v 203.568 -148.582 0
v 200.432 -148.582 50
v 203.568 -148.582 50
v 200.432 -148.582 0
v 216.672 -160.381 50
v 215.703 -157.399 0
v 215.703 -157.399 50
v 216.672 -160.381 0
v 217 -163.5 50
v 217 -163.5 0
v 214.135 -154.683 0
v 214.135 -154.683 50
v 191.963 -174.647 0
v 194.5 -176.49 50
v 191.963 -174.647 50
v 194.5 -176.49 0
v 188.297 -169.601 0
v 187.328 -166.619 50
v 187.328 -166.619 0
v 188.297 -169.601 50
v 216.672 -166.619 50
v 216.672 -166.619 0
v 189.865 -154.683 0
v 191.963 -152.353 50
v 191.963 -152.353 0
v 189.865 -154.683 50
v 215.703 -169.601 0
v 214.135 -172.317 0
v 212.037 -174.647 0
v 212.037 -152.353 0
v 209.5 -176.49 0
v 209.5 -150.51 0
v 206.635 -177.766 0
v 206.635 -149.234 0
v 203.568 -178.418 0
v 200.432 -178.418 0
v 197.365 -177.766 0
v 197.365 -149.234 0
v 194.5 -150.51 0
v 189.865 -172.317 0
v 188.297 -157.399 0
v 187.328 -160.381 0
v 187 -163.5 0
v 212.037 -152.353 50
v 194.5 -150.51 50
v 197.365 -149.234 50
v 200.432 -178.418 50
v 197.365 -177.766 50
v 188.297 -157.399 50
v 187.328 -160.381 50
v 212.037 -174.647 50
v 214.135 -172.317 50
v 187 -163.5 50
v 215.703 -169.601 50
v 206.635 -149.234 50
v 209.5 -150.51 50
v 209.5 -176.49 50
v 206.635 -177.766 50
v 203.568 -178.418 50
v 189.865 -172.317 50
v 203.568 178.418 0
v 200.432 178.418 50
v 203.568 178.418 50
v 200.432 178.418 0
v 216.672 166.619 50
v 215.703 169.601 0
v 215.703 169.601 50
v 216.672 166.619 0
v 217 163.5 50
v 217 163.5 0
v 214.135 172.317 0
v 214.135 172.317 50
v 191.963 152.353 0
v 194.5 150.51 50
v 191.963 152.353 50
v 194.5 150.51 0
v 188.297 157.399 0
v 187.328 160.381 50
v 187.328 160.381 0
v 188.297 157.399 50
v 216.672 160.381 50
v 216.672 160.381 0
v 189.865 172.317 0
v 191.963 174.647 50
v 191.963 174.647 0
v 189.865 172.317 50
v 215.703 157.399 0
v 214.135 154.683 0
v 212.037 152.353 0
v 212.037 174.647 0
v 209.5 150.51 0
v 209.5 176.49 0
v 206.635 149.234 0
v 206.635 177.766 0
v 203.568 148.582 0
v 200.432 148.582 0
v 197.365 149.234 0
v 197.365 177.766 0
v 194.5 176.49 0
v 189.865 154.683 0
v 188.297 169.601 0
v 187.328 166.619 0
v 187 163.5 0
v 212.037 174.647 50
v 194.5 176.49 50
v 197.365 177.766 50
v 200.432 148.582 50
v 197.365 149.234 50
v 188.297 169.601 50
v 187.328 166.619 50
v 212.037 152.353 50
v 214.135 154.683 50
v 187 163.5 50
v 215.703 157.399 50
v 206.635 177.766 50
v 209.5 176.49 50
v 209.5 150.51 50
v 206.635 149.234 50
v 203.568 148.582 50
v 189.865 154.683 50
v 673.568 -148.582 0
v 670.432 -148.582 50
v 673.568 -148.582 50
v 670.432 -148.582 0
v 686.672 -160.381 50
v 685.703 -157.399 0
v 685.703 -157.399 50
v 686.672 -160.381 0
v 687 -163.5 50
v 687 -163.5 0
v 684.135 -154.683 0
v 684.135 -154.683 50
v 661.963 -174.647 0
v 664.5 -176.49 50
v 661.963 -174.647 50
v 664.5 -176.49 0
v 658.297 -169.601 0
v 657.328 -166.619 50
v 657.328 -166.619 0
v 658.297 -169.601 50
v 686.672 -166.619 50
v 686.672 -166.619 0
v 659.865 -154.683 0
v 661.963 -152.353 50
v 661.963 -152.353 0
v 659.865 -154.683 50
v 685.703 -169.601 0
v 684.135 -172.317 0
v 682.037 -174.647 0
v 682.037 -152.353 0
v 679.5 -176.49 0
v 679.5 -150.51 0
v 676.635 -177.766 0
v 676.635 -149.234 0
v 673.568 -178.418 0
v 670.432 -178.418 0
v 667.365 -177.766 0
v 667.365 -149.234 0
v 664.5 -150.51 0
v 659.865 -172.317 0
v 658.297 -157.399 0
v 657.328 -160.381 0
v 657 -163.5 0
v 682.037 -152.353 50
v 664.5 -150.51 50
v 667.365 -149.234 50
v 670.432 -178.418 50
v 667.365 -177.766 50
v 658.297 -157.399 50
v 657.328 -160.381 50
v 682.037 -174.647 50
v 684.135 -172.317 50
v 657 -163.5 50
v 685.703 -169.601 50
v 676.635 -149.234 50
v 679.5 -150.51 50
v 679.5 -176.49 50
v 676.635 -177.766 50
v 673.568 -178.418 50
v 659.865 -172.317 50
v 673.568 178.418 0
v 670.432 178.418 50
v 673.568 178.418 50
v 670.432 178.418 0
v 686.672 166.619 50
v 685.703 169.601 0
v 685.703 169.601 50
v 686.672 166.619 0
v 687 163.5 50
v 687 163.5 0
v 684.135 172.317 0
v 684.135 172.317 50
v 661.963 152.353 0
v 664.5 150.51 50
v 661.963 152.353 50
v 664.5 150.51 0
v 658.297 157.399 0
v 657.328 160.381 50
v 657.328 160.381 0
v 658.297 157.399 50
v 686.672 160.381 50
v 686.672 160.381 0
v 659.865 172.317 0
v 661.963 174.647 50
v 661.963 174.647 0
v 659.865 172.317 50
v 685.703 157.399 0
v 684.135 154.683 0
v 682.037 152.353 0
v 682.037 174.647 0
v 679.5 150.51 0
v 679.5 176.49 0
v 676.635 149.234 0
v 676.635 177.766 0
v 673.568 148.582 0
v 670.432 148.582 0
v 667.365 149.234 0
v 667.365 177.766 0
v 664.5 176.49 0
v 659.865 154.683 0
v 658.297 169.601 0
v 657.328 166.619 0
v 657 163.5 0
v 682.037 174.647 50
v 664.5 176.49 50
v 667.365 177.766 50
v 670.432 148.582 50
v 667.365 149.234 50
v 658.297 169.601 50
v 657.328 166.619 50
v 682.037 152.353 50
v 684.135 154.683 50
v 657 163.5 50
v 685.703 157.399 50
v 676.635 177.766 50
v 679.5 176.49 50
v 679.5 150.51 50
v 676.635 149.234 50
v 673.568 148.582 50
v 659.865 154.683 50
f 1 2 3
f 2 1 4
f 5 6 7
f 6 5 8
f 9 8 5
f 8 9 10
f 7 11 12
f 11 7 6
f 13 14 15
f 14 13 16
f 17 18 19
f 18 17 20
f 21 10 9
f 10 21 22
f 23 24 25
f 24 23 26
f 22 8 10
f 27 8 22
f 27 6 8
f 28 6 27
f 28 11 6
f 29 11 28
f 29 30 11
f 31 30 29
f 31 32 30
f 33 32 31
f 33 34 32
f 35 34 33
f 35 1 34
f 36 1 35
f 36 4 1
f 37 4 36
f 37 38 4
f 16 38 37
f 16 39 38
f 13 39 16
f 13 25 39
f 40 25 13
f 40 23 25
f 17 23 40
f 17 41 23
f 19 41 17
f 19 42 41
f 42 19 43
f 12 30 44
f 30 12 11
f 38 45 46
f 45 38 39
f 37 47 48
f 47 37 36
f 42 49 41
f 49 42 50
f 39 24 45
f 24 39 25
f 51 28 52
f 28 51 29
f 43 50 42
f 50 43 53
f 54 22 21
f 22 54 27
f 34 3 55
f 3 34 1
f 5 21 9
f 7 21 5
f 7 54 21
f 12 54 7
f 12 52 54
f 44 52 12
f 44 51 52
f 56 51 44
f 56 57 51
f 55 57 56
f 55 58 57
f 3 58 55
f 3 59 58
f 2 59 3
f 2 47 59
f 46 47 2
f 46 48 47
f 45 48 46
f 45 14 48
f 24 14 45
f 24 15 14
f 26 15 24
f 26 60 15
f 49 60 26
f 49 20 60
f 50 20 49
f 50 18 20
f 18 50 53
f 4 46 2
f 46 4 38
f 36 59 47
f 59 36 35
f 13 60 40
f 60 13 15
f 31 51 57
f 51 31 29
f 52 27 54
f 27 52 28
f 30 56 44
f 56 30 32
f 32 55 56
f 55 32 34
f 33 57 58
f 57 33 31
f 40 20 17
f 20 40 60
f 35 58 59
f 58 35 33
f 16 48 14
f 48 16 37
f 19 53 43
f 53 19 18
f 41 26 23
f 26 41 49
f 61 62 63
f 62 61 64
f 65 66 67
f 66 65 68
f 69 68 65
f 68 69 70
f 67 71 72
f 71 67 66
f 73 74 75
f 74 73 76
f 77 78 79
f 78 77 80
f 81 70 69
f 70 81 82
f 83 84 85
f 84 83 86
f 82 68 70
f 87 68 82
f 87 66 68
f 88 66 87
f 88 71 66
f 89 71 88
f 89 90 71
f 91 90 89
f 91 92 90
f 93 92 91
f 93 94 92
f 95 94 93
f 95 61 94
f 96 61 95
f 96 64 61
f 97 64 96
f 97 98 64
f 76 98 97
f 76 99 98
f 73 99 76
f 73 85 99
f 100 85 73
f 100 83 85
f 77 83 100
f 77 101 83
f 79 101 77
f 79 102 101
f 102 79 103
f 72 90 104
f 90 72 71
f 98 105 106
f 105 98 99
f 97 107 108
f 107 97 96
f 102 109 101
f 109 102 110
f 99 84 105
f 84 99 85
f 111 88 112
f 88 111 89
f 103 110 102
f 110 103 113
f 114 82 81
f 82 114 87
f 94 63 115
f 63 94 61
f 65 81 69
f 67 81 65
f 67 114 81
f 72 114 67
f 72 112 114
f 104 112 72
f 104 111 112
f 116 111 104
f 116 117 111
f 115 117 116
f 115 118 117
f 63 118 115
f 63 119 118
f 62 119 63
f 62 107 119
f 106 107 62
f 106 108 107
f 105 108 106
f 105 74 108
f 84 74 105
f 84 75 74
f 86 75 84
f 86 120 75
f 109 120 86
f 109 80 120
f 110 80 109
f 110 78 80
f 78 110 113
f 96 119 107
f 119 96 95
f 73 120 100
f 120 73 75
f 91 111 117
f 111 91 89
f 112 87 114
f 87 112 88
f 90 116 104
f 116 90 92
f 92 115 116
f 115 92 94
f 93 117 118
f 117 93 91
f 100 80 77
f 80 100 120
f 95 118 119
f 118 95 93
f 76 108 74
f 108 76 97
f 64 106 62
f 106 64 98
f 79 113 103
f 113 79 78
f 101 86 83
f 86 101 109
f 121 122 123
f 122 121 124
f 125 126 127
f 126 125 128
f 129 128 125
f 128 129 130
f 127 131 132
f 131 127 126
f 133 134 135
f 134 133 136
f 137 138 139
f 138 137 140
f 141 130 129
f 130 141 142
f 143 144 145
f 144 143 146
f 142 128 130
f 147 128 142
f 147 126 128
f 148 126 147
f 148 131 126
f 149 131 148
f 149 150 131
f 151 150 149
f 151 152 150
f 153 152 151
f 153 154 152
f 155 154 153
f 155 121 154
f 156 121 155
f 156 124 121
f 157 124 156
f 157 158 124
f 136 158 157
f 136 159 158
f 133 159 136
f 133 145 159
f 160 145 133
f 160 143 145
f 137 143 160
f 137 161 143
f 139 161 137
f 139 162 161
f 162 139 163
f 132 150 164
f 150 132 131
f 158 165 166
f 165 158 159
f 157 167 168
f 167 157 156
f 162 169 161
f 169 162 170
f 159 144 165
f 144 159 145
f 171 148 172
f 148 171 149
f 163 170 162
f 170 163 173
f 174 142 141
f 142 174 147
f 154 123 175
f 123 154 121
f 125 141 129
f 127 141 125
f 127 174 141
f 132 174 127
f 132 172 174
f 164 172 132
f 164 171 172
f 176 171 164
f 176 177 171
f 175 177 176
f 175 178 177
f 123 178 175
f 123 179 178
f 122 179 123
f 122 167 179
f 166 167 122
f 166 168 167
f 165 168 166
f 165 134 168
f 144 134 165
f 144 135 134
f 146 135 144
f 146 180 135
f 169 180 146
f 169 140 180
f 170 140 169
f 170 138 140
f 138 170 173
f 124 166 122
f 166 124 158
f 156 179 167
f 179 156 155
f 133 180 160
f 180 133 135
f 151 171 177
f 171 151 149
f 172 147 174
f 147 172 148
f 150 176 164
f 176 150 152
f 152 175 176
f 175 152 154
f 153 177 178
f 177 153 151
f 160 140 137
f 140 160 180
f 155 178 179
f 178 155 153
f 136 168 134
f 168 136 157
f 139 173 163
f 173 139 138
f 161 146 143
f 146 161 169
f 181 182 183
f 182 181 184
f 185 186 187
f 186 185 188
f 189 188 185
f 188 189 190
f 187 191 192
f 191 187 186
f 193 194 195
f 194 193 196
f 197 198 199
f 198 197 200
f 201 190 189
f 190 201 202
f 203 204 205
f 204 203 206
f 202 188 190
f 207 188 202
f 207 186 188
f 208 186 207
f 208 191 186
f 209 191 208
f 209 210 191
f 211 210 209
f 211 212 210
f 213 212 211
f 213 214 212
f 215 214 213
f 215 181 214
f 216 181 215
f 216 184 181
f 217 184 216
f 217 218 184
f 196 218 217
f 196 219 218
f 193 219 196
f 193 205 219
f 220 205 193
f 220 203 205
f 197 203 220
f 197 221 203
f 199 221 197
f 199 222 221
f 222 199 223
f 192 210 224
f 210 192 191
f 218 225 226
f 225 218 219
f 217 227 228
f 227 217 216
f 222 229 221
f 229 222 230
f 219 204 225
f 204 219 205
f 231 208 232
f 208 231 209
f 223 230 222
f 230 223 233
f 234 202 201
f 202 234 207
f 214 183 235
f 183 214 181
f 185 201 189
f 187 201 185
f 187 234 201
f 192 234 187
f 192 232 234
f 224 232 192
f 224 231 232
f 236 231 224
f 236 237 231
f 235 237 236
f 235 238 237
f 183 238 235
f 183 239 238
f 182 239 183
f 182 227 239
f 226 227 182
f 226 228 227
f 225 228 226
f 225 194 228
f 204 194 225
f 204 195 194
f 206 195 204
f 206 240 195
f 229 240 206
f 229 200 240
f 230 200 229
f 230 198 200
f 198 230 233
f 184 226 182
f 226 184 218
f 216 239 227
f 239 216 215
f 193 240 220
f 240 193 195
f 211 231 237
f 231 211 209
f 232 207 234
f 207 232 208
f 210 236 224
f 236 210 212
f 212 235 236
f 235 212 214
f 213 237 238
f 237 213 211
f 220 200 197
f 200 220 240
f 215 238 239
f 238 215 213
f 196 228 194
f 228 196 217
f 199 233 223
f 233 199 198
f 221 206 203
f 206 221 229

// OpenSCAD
// The four stilts the Ahmed body stands on, measured from the nose along x and
// from the symmetry plane along y. They run from the floor (z = 0) up to the
// underside of the body.

module stilts() {
    diameter = 30;
    length = 50;
    for (x = [202, 672], side = [-1, 1])
        translate([x, side * 163.5, 0])
            cylinder(d = diameter, h = length);
}

stilts();
